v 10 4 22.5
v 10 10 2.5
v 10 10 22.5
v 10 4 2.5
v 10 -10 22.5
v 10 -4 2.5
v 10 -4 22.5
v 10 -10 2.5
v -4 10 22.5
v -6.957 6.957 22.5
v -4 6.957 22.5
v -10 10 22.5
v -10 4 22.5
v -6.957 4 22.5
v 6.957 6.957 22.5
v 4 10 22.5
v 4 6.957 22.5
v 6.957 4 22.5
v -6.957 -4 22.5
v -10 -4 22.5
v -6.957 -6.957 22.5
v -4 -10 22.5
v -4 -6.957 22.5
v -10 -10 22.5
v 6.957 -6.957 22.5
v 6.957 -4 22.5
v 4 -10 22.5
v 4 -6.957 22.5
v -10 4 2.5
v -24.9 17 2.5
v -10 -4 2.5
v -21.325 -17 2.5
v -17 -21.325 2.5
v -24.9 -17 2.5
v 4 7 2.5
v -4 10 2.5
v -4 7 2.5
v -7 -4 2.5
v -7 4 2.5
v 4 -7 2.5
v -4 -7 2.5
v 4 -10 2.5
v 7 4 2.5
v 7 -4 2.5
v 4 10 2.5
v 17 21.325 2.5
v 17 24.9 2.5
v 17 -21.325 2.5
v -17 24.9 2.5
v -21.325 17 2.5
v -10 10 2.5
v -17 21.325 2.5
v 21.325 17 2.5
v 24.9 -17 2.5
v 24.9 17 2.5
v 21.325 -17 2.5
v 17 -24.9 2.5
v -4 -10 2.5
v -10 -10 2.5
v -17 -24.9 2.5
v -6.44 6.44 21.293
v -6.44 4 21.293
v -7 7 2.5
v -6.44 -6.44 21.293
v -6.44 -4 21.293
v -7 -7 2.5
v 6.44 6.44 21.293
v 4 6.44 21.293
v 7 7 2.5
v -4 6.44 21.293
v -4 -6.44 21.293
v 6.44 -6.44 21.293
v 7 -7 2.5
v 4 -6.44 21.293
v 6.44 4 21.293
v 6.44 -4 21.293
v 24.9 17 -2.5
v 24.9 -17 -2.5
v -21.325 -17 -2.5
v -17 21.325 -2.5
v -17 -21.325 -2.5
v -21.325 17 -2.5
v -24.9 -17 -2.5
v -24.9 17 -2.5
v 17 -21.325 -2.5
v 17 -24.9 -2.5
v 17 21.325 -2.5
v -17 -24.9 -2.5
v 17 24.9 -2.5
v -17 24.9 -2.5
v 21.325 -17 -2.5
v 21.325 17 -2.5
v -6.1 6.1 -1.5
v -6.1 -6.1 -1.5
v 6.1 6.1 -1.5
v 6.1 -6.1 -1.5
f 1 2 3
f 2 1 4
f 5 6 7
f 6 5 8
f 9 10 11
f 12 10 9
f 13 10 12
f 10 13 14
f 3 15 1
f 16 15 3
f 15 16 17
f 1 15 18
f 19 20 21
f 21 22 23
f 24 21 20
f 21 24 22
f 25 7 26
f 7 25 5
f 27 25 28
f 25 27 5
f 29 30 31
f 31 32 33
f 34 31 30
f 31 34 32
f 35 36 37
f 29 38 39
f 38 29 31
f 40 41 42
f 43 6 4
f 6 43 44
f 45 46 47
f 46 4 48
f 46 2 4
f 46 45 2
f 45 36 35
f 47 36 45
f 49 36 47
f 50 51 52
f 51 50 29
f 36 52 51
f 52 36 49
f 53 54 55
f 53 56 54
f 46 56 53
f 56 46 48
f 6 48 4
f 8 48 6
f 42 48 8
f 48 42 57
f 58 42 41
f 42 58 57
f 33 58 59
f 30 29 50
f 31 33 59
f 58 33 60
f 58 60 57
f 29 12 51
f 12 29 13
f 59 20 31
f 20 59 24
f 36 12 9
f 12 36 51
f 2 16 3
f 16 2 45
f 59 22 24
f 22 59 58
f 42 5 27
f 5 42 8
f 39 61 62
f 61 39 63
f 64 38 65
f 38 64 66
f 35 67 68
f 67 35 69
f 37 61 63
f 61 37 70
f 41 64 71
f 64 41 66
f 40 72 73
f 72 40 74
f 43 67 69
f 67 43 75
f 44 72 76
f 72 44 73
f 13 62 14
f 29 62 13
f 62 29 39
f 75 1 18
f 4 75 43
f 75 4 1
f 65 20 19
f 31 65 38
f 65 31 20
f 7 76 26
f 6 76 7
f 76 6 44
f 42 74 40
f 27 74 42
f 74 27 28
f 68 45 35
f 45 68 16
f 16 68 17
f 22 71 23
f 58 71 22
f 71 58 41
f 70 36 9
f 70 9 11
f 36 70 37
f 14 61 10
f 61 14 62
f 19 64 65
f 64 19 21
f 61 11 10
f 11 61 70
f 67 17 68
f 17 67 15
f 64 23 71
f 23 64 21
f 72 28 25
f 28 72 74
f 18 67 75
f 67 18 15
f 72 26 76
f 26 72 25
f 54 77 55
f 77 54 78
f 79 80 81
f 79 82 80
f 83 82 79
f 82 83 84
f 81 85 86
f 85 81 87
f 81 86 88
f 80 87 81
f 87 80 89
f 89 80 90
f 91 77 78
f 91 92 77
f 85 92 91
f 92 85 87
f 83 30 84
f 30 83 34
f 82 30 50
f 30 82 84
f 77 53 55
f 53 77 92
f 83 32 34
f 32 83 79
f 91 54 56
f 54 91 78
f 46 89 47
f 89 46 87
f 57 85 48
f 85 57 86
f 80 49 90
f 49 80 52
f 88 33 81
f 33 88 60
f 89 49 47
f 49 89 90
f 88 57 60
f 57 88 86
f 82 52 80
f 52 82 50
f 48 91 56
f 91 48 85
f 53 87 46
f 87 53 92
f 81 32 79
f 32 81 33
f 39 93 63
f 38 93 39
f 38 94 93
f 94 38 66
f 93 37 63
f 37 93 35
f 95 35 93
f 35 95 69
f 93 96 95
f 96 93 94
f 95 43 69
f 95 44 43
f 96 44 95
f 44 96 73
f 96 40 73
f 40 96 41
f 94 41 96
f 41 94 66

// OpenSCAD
//Cube insert: Perpendicular 


/* [Hiden] */
$fn = 80;
eps = .002;
a = 49.8;
b = 33.6;
c = 6.28;
d = 53.8;
h = 5;

tol = 0.1;

l_cuv = 12;
w_cuv = 12;
h_cuv = 30;
dist_cuv = 1;
z_cuv = -4;

l_therm = 3-tol;
h_therm = 20;
w_therm = 20;

l_holder = 20;
w_holder = 20;
h_holder = 20;
l_frame = 3;
l_pin = 2;



h_open = 18;

h_top = h_holder-h_open;

IM_offset = 0.2;



insert();

module trunc_pyramid(la, wa, lb, wb, h) {
    la = la / 2;
    wa = wa / 2;
    lb = lb / 2;
    wb = wb / 2;

    polyhedron(
        points=[
            // bottom
            [ la,  wa, 0],   // 0
            [ la, -wa, 0],   // 1
            [-la, -wa, 0],   // 2
            [-la,  wa, 0],   // 3

            // top
            [ lb,  wb, h],   // 4
            [ lb, -wb, h],   // 5
            [-lb, -wb, h],   // 6
            [-lb,  wb, h]    // 7
        ],

        faces=[
            // bottom (außen zeigt nach -Z, also CCW von unten)
            [0,2,1],
            [0,3,2],

            // top (außen zeigt nach +Z, also CCW von oben)
            [4,6,7],
            [4,5,6],

            // sides (alle CCW von außen)
            [0,1,5], [0,5,4],
            [1,2,6], [1,6,5],
            [2,3,7], [2,7,6],
            [3,0,4], [3,4,7]
        ],

        convexity = 20
    );
}



module insert() {
    translate([-l_cuv/2,-w_cuv/2,h/2]) {%cube([l_cuv, w_cuv, h_cuv]); }
    translate([-a/2,-w_therm/2,h/2]) {color([0,0,1]) %cube([l_therm, w_therm, h_therm]); };
    
    difference() {
    translate([-l_holder/2,-w_holder/2,h/2]) {cube([l_holder, w_holder, h_holder]); }
    translate([0,0,h/2]) {trunc_pyramid(l_cuv+2*dist_cuv, w_cuv+2*dist_cuv, l_cuv+2*tol, w_cuv+2*tol, h_cuv+2*tol); }
  


    
    translate([-dist_cuv-l_holder/2,l_pin-w_cuv/2,h/2]) {cube([l_holder+2*dist_cuv, w_cuv-2*l_pin, h_holder+tol]); }
    translate([l_pin-l_cuv/2,-dist_cuv-w_holder/2,h/2]) {cube([l_cuv-2*l_pin, w_holder+dist_cuv*2, h_holder+tol]); }
    
    
    translate([0,0,h/2+h_holder-h_top]) {trunc_pyramid(l_cuv+2*tol, w_cuv+2*tol, l_cuv+2*dist_cuv, w_cuv+2*dist_cuv, h_top+tol);}

    
    }

    difference() {
        union() {   //basic insert design
                cube([a,b+2*IM_offset,h], center=true);
                cube([b+2*IM_offset,a,h], center=true);
                rotate(a=[0,0,45]){
                    cube([c,d+2*IM_offset,h], center=true);
                }
                rotate(a=[0,0,-45]){
                    cube([c,d+2*IM_offset,h], center=true);
                }
            }
        translate([0,0,h/2+z_cuv]) {trunc_pyramid(l_cuv+2*tol, w_cuv+2*tol, l_cuv+2*dist_cuv, w_cuv+2*dist_cuv, -z_cuv);}
    }
}
